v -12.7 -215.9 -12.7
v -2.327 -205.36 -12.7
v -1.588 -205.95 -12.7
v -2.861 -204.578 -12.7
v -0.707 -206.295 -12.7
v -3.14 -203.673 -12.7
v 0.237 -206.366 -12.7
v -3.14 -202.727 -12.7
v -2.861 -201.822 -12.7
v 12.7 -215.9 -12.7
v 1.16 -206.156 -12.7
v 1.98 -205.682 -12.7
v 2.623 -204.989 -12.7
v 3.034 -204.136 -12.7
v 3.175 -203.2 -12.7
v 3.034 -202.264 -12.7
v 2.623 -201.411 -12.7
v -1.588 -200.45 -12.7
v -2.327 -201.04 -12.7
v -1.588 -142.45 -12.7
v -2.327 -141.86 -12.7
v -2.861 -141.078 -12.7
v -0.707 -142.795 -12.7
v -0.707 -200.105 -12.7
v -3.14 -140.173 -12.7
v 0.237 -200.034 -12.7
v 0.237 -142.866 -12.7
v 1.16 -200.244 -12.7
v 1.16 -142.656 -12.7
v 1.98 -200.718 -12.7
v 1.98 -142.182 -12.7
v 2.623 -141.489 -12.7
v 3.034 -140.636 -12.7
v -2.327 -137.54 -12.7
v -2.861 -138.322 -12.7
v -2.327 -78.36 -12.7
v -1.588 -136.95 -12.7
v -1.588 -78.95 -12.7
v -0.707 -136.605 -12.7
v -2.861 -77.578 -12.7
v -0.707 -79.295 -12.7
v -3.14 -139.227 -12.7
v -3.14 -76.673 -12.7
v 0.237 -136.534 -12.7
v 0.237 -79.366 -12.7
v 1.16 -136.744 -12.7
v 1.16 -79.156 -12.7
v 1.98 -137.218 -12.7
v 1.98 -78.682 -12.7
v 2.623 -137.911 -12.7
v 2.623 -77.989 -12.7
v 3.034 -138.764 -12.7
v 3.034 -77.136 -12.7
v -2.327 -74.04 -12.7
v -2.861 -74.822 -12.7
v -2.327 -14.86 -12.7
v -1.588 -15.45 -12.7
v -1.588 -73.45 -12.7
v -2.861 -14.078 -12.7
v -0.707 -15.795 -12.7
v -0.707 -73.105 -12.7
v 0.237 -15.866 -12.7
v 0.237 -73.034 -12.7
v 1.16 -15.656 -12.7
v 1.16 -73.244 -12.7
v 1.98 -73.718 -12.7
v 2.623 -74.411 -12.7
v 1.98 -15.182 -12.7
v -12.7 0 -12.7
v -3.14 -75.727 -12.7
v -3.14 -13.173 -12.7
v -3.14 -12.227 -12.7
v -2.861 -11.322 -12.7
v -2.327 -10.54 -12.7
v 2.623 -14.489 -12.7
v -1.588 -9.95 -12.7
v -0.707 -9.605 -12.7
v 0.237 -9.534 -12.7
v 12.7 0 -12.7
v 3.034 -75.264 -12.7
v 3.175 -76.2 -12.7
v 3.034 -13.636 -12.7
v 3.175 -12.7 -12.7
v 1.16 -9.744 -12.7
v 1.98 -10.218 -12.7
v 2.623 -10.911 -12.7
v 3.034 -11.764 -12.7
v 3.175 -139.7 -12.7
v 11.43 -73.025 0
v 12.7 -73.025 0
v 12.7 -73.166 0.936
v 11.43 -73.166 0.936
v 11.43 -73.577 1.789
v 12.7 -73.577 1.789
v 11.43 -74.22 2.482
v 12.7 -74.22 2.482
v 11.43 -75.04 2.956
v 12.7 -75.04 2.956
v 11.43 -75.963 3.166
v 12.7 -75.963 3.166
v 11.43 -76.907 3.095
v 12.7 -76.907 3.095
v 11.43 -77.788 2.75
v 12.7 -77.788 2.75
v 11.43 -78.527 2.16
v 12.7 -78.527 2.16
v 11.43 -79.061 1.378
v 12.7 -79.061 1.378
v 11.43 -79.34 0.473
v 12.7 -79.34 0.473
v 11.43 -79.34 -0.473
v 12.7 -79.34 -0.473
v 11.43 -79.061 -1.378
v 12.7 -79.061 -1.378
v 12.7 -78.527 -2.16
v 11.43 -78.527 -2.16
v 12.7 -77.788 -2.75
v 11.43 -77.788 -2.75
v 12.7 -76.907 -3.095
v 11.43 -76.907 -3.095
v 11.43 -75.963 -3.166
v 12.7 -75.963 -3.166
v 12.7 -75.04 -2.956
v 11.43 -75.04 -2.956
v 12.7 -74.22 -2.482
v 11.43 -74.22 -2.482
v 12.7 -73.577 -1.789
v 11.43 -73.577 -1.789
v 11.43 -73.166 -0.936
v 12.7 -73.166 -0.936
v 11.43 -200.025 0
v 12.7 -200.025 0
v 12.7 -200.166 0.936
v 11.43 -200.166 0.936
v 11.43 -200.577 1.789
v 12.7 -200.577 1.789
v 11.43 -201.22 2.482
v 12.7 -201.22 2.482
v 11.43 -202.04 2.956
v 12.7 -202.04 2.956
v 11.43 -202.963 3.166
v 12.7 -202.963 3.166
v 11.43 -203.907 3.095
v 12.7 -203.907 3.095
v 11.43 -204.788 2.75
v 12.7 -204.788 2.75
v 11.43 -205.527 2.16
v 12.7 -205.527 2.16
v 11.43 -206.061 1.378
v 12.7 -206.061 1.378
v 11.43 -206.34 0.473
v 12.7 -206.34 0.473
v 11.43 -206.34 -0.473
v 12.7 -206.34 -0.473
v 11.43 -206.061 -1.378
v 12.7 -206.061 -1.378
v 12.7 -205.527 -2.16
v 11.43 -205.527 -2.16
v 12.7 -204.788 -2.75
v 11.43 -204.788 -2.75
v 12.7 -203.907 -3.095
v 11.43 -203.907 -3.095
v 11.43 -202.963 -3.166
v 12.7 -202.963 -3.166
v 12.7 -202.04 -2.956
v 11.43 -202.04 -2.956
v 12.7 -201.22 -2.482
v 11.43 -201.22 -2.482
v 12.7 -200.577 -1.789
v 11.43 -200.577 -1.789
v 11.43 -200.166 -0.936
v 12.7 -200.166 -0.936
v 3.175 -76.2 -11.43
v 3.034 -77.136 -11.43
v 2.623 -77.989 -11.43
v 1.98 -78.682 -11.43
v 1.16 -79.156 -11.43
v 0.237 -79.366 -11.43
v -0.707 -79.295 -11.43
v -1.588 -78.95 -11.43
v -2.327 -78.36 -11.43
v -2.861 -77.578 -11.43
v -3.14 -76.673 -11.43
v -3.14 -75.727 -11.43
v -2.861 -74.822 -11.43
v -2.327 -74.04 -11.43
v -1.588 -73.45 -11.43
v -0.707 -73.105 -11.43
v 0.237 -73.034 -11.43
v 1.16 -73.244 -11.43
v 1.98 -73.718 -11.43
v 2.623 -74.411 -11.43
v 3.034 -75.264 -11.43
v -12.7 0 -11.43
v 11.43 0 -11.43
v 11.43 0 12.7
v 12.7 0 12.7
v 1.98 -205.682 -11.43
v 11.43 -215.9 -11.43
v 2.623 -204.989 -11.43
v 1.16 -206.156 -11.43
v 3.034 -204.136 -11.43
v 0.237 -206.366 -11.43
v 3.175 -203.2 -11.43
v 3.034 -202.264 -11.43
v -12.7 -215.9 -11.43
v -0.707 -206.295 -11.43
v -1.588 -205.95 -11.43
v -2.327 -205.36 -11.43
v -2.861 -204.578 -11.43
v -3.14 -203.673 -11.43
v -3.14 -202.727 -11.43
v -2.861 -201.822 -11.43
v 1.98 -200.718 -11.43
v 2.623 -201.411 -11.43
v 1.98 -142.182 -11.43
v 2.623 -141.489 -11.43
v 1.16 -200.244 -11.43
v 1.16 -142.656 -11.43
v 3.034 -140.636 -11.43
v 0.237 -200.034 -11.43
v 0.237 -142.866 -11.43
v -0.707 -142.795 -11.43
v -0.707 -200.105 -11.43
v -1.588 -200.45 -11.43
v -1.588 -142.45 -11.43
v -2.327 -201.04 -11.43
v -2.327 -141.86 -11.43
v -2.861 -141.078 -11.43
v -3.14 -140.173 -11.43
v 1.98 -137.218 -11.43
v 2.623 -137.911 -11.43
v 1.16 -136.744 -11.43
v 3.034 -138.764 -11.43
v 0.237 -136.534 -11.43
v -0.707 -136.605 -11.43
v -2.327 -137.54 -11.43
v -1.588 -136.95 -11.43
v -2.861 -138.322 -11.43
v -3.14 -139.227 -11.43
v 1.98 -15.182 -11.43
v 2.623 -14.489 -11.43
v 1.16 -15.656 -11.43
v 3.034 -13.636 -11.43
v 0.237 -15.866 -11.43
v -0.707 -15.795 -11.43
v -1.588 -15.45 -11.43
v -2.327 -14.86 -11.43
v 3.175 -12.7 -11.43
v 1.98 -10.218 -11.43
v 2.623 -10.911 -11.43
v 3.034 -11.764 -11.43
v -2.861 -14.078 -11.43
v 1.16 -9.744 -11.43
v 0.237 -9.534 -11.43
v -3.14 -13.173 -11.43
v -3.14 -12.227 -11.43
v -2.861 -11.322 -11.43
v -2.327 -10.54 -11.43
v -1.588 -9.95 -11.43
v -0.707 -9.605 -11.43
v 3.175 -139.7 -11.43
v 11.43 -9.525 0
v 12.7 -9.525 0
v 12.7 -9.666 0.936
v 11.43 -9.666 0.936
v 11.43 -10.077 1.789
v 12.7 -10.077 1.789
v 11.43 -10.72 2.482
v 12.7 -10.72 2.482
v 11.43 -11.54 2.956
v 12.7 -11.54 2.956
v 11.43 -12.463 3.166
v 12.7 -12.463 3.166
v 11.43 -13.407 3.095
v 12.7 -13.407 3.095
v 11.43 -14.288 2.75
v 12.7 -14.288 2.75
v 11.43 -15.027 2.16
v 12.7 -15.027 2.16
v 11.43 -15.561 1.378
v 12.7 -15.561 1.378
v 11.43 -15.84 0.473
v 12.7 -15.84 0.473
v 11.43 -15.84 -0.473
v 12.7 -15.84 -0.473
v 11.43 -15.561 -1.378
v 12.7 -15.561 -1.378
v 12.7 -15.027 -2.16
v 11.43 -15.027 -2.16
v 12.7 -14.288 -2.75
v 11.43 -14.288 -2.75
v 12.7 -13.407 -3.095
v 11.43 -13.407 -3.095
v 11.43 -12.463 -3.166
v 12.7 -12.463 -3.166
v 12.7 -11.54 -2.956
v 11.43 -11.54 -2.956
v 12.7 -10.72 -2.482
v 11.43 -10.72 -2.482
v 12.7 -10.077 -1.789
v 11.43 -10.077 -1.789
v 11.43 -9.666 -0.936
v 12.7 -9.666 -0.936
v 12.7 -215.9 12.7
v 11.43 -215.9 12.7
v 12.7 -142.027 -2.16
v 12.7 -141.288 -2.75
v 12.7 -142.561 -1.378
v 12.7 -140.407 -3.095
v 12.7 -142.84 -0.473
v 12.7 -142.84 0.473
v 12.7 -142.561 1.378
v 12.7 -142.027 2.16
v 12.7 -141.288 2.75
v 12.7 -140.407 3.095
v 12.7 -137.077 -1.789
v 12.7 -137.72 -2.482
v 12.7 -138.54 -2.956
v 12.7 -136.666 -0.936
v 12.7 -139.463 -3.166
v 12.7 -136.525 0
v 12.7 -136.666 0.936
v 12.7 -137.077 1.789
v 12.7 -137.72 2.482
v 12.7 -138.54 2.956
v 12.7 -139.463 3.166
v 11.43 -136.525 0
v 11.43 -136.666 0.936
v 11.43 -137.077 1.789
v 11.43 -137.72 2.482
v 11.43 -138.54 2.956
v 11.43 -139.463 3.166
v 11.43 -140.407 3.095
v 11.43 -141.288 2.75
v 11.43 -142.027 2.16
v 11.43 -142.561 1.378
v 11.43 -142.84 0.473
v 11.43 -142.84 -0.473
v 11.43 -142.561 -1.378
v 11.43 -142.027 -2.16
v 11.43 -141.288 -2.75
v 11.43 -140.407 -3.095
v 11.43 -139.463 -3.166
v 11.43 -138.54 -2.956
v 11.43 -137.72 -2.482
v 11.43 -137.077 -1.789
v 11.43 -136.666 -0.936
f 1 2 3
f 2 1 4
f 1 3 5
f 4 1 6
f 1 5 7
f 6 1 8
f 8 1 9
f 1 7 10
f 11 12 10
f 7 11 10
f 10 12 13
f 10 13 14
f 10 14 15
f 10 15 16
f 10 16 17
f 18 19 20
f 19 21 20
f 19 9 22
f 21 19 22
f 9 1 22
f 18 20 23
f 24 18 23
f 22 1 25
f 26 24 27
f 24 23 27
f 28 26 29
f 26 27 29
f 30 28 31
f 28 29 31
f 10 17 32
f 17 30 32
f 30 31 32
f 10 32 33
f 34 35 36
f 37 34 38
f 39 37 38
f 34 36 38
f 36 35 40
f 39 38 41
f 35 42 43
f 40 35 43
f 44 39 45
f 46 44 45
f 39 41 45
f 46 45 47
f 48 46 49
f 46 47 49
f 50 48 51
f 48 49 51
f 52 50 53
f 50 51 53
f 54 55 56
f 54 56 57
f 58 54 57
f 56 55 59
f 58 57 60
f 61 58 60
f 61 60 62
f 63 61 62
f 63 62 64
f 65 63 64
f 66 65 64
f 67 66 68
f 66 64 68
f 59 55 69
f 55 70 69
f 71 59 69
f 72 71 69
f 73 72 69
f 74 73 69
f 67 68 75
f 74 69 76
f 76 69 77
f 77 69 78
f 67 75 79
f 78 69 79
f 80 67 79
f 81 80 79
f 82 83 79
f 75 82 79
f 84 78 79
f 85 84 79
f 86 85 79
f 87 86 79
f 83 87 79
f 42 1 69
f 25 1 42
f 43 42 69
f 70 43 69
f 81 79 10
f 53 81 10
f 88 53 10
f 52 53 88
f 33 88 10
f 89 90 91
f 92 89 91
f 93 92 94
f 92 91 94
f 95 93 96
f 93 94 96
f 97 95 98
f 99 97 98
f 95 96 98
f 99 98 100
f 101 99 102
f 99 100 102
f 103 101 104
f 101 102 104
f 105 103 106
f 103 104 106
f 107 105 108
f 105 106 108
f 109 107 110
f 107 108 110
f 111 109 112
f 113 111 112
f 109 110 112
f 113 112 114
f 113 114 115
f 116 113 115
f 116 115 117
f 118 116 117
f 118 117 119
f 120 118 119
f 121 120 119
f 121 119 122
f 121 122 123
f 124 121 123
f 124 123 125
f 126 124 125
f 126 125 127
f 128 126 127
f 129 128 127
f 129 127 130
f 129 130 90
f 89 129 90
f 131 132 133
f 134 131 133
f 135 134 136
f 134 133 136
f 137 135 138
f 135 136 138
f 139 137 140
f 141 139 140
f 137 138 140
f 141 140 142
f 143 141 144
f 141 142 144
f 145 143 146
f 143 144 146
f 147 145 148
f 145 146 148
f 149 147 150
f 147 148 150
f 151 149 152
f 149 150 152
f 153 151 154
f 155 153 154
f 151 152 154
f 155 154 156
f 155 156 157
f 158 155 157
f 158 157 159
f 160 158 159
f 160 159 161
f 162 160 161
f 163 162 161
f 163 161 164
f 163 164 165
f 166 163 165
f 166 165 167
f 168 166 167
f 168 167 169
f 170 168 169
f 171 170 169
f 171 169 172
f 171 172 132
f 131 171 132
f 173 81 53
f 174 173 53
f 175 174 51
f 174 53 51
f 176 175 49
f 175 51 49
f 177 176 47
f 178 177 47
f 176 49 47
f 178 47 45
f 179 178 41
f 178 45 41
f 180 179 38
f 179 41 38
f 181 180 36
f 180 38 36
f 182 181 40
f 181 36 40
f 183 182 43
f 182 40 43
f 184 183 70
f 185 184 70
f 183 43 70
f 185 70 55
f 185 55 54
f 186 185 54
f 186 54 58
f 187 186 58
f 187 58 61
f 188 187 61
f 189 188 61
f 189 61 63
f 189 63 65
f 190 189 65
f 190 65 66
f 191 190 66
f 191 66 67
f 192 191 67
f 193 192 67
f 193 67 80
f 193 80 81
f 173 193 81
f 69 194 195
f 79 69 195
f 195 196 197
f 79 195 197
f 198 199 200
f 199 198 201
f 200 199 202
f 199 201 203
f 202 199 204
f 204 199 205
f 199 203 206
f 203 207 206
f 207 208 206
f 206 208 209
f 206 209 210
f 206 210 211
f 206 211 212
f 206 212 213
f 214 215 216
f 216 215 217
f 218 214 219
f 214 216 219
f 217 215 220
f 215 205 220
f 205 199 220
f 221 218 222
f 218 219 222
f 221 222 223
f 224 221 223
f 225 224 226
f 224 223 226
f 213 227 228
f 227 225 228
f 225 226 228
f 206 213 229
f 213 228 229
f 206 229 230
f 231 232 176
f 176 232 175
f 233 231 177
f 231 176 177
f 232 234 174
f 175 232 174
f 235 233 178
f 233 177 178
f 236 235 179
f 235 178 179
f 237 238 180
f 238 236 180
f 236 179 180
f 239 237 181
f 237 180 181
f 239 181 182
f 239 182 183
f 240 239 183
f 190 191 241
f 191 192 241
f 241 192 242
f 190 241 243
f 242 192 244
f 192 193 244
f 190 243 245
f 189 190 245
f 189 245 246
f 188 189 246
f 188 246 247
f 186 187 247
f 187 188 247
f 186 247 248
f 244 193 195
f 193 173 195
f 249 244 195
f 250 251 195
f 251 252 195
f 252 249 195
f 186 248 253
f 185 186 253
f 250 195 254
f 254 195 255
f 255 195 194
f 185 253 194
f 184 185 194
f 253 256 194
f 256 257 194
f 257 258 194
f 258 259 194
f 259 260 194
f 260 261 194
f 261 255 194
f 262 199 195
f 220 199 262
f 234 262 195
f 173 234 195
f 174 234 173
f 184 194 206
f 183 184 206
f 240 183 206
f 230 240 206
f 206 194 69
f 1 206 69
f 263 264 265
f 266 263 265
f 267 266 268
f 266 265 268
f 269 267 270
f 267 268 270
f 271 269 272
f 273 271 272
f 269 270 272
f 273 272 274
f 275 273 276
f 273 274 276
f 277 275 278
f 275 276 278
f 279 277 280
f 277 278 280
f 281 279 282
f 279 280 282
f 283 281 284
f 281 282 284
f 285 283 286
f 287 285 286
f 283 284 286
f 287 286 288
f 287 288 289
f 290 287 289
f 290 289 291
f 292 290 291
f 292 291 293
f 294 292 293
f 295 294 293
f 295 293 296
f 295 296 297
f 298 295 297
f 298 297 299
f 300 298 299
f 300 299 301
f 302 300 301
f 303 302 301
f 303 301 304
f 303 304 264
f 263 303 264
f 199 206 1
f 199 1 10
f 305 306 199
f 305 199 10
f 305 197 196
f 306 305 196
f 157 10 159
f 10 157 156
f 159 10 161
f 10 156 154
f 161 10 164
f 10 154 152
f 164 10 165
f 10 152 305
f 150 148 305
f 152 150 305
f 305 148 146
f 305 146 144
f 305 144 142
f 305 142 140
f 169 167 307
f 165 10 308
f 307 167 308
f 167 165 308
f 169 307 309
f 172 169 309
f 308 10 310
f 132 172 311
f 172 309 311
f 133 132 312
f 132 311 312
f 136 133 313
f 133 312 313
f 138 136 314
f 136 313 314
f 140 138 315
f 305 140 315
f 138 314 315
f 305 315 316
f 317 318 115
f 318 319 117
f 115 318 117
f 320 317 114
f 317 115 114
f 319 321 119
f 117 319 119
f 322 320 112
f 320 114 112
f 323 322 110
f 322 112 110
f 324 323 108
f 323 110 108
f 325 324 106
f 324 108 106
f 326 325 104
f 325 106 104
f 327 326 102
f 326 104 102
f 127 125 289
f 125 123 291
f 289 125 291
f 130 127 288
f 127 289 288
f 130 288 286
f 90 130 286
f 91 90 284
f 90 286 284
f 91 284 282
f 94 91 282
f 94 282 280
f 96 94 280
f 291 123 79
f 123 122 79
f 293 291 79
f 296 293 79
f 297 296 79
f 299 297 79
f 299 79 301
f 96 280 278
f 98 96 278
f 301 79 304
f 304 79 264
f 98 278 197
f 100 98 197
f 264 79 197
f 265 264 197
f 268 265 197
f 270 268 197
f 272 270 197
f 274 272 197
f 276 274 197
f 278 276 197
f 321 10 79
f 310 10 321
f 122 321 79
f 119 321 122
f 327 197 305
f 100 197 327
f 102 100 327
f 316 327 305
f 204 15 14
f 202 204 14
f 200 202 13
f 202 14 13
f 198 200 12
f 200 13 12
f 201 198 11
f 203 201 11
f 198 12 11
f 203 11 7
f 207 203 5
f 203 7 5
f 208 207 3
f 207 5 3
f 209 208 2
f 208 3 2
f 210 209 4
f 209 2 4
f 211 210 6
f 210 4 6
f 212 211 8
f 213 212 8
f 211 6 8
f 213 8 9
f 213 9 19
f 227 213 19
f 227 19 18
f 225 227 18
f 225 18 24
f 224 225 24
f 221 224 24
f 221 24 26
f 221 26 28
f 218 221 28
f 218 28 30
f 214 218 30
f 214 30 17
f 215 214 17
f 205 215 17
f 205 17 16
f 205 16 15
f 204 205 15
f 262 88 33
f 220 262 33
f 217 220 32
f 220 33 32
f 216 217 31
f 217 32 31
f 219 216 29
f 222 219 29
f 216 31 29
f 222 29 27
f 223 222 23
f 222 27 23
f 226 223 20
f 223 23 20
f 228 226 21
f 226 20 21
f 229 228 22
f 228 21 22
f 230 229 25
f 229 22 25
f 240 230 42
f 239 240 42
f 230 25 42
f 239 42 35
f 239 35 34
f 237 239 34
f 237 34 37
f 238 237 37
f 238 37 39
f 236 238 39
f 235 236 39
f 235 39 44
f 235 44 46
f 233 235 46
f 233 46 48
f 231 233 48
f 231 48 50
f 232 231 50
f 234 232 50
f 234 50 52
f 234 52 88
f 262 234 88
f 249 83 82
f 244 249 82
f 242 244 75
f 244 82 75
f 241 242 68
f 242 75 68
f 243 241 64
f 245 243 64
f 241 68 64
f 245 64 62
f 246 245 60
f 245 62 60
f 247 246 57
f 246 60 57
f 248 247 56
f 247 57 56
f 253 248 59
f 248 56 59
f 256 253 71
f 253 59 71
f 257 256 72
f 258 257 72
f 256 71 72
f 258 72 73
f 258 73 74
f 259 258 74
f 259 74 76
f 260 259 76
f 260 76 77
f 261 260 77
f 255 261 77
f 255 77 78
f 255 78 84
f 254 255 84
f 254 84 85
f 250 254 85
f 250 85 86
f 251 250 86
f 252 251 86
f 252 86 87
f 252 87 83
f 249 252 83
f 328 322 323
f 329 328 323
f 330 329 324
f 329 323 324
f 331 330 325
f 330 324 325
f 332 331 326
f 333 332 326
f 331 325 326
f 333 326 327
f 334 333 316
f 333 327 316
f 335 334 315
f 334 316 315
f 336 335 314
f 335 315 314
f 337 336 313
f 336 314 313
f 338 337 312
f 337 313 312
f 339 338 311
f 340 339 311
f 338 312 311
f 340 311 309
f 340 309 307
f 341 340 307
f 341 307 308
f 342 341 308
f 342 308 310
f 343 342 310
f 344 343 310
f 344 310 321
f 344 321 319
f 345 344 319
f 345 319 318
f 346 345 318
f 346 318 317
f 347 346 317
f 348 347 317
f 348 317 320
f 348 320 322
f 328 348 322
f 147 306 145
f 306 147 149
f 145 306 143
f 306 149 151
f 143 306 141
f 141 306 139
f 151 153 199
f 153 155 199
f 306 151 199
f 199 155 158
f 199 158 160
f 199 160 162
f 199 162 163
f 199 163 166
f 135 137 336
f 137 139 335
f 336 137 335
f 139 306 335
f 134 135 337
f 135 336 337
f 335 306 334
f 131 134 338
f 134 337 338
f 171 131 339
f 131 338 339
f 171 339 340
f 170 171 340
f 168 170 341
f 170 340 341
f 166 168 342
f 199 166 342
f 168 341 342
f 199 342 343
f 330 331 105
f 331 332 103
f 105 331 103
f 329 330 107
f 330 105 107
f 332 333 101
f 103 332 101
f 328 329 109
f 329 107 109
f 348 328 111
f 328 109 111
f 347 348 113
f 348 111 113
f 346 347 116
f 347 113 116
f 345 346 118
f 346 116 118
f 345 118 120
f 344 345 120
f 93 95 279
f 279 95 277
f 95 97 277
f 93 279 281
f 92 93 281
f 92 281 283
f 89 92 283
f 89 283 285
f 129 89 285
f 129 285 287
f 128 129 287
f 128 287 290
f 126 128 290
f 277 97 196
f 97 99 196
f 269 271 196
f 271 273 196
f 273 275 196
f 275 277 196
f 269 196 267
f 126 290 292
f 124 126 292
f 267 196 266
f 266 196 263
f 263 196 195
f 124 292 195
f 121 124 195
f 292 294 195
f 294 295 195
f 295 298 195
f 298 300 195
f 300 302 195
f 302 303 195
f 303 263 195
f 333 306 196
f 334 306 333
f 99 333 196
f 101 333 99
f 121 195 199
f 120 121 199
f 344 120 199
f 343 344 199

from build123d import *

# Parameters (mm, degrees)
F1_DEPTH = 215.9
F2_R     = 3.175
F3_DEPTH = 25.401
F4_R     = 3.175
F5_DEPTH = 25.4


with BuildPart() as f1:
    # F0 (on Front) → F1 (new body)
    with BuildSketch(Plane.XZ):
        Polygon((-12.7, -11.43), (-12.7, -12.7), (12.7, -12.7), (12.7, 12.7), (11.43, 12.7), (11.43, -11.43), align=None)
    extrude(amount=F1_DEPTH)

    # F2 (on face) → F3 (cut, through all)
    with BuildSketch(Plane(origin=(0, 0, -12.7), x_dir=(1, 0, 0), z_dir=(0, 0, -1))):
        with Locations((0, 203.2)):
            Circle(F2_R)
        with Locations((0, 139.7)):
            Circle(F2_R)
        with Locations((0, 76.2)):
            Circle(F2_R)
        with Locations((0, 12.7)):
            Circle(F2_R)
    extrude(amount=-F3_DEPTH, mode=Mode.SUBTRACT)

    # F4 (on face) → F5 (cut)
    with BuildSketch(Plane.YZ.offset(12.7)):
        with Locations((-139.7, 0)):
            Circle(F4_R)
        with Locations((-203.2, 0)):
            Circle(F4_R)
        with Locations((-76.2, 0)):
            Circle(F4_R)
        with Locations((-12.7, 0)):
            Circle(F4_R)
    extrude(amount=-F5_DEPTH, mode=Mode.SUBTRACT)


solid = f1.part
